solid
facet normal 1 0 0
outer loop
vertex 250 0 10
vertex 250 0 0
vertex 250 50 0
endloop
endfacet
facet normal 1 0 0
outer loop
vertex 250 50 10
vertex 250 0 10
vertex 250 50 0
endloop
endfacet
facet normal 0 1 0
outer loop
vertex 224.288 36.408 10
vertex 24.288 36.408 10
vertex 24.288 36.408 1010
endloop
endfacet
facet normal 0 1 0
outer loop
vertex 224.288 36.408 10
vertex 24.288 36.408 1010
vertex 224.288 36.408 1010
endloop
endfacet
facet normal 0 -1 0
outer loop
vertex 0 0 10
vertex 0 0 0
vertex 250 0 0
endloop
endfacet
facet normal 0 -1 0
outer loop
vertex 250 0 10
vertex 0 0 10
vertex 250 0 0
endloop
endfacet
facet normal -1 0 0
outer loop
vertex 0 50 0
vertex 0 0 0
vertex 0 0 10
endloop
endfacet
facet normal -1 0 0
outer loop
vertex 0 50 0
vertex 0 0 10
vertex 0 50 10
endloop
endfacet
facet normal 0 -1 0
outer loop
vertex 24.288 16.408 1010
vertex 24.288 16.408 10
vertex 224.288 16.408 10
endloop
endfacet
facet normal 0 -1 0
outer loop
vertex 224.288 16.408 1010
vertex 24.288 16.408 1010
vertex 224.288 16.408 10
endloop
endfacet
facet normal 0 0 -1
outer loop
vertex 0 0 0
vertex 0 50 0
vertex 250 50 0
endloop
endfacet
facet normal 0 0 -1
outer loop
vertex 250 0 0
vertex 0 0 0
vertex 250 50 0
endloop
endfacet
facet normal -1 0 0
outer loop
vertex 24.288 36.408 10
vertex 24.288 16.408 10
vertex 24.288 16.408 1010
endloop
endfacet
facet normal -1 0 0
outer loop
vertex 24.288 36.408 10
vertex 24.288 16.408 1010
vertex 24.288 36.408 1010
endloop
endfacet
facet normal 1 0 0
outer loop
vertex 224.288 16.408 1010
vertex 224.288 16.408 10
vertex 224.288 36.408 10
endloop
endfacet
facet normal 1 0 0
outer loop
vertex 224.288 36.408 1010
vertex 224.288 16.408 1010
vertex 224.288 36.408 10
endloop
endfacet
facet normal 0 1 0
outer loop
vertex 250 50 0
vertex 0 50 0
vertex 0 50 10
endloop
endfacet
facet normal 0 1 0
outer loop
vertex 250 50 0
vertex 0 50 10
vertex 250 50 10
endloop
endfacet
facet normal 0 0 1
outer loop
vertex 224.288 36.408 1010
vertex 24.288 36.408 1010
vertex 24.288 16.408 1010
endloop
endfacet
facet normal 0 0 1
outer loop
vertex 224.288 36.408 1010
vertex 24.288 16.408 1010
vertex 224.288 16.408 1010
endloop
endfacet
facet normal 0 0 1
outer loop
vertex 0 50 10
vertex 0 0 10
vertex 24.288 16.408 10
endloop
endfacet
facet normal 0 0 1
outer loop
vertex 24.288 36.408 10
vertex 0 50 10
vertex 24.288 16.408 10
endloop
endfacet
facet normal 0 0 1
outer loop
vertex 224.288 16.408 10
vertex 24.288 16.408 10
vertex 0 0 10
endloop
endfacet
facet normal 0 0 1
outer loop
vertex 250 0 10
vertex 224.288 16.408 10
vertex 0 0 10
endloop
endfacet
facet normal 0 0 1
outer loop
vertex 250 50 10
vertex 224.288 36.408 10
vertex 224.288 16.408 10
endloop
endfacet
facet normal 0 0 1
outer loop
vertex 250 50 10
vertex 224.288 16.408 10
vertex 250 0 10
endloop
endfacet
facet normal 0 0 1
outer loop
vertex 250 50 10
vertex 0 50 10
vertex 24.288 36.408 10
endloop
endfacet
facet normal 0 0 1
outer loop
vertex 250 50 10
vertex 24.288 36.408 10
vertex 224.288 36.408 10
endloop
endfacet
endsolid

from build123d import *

# Parameters (mm, degrees)
ESBO_O2_W                = 250
ESBO_O2_H                = 50
RESSALTO_EXTRUS_O1_DEPTH = 10
ESBO_O4_W                = 200
ESBO_O4_H                = 20
RESSALTO_EXTRUS_O2_DEPTH = 1000


with BuildPart() as part:
    # Esboço2 → Ressalto-extrusão1 (new body)
    with BuildSketch(Plane.XY):
        with Locations((125, 25)):
            Rectangle(ESBO_O2_W, ESBO_O2_H)
    extrude(amount=RESSALTO_EXTRUS_O1_DEPTH)

    # Esboço4 → Ressalto-extrusão2 (add)
    with BuildSketch(Plane.XY.offset(10)):
        with Locations((124.287859988, 26.407647707)):
            Rectangle(ESBO_O4_W, ESBO_O4_H)
    extrude(amount=RESSALTO_EXTRUS_O2_DEPTH)


solid = part.part
